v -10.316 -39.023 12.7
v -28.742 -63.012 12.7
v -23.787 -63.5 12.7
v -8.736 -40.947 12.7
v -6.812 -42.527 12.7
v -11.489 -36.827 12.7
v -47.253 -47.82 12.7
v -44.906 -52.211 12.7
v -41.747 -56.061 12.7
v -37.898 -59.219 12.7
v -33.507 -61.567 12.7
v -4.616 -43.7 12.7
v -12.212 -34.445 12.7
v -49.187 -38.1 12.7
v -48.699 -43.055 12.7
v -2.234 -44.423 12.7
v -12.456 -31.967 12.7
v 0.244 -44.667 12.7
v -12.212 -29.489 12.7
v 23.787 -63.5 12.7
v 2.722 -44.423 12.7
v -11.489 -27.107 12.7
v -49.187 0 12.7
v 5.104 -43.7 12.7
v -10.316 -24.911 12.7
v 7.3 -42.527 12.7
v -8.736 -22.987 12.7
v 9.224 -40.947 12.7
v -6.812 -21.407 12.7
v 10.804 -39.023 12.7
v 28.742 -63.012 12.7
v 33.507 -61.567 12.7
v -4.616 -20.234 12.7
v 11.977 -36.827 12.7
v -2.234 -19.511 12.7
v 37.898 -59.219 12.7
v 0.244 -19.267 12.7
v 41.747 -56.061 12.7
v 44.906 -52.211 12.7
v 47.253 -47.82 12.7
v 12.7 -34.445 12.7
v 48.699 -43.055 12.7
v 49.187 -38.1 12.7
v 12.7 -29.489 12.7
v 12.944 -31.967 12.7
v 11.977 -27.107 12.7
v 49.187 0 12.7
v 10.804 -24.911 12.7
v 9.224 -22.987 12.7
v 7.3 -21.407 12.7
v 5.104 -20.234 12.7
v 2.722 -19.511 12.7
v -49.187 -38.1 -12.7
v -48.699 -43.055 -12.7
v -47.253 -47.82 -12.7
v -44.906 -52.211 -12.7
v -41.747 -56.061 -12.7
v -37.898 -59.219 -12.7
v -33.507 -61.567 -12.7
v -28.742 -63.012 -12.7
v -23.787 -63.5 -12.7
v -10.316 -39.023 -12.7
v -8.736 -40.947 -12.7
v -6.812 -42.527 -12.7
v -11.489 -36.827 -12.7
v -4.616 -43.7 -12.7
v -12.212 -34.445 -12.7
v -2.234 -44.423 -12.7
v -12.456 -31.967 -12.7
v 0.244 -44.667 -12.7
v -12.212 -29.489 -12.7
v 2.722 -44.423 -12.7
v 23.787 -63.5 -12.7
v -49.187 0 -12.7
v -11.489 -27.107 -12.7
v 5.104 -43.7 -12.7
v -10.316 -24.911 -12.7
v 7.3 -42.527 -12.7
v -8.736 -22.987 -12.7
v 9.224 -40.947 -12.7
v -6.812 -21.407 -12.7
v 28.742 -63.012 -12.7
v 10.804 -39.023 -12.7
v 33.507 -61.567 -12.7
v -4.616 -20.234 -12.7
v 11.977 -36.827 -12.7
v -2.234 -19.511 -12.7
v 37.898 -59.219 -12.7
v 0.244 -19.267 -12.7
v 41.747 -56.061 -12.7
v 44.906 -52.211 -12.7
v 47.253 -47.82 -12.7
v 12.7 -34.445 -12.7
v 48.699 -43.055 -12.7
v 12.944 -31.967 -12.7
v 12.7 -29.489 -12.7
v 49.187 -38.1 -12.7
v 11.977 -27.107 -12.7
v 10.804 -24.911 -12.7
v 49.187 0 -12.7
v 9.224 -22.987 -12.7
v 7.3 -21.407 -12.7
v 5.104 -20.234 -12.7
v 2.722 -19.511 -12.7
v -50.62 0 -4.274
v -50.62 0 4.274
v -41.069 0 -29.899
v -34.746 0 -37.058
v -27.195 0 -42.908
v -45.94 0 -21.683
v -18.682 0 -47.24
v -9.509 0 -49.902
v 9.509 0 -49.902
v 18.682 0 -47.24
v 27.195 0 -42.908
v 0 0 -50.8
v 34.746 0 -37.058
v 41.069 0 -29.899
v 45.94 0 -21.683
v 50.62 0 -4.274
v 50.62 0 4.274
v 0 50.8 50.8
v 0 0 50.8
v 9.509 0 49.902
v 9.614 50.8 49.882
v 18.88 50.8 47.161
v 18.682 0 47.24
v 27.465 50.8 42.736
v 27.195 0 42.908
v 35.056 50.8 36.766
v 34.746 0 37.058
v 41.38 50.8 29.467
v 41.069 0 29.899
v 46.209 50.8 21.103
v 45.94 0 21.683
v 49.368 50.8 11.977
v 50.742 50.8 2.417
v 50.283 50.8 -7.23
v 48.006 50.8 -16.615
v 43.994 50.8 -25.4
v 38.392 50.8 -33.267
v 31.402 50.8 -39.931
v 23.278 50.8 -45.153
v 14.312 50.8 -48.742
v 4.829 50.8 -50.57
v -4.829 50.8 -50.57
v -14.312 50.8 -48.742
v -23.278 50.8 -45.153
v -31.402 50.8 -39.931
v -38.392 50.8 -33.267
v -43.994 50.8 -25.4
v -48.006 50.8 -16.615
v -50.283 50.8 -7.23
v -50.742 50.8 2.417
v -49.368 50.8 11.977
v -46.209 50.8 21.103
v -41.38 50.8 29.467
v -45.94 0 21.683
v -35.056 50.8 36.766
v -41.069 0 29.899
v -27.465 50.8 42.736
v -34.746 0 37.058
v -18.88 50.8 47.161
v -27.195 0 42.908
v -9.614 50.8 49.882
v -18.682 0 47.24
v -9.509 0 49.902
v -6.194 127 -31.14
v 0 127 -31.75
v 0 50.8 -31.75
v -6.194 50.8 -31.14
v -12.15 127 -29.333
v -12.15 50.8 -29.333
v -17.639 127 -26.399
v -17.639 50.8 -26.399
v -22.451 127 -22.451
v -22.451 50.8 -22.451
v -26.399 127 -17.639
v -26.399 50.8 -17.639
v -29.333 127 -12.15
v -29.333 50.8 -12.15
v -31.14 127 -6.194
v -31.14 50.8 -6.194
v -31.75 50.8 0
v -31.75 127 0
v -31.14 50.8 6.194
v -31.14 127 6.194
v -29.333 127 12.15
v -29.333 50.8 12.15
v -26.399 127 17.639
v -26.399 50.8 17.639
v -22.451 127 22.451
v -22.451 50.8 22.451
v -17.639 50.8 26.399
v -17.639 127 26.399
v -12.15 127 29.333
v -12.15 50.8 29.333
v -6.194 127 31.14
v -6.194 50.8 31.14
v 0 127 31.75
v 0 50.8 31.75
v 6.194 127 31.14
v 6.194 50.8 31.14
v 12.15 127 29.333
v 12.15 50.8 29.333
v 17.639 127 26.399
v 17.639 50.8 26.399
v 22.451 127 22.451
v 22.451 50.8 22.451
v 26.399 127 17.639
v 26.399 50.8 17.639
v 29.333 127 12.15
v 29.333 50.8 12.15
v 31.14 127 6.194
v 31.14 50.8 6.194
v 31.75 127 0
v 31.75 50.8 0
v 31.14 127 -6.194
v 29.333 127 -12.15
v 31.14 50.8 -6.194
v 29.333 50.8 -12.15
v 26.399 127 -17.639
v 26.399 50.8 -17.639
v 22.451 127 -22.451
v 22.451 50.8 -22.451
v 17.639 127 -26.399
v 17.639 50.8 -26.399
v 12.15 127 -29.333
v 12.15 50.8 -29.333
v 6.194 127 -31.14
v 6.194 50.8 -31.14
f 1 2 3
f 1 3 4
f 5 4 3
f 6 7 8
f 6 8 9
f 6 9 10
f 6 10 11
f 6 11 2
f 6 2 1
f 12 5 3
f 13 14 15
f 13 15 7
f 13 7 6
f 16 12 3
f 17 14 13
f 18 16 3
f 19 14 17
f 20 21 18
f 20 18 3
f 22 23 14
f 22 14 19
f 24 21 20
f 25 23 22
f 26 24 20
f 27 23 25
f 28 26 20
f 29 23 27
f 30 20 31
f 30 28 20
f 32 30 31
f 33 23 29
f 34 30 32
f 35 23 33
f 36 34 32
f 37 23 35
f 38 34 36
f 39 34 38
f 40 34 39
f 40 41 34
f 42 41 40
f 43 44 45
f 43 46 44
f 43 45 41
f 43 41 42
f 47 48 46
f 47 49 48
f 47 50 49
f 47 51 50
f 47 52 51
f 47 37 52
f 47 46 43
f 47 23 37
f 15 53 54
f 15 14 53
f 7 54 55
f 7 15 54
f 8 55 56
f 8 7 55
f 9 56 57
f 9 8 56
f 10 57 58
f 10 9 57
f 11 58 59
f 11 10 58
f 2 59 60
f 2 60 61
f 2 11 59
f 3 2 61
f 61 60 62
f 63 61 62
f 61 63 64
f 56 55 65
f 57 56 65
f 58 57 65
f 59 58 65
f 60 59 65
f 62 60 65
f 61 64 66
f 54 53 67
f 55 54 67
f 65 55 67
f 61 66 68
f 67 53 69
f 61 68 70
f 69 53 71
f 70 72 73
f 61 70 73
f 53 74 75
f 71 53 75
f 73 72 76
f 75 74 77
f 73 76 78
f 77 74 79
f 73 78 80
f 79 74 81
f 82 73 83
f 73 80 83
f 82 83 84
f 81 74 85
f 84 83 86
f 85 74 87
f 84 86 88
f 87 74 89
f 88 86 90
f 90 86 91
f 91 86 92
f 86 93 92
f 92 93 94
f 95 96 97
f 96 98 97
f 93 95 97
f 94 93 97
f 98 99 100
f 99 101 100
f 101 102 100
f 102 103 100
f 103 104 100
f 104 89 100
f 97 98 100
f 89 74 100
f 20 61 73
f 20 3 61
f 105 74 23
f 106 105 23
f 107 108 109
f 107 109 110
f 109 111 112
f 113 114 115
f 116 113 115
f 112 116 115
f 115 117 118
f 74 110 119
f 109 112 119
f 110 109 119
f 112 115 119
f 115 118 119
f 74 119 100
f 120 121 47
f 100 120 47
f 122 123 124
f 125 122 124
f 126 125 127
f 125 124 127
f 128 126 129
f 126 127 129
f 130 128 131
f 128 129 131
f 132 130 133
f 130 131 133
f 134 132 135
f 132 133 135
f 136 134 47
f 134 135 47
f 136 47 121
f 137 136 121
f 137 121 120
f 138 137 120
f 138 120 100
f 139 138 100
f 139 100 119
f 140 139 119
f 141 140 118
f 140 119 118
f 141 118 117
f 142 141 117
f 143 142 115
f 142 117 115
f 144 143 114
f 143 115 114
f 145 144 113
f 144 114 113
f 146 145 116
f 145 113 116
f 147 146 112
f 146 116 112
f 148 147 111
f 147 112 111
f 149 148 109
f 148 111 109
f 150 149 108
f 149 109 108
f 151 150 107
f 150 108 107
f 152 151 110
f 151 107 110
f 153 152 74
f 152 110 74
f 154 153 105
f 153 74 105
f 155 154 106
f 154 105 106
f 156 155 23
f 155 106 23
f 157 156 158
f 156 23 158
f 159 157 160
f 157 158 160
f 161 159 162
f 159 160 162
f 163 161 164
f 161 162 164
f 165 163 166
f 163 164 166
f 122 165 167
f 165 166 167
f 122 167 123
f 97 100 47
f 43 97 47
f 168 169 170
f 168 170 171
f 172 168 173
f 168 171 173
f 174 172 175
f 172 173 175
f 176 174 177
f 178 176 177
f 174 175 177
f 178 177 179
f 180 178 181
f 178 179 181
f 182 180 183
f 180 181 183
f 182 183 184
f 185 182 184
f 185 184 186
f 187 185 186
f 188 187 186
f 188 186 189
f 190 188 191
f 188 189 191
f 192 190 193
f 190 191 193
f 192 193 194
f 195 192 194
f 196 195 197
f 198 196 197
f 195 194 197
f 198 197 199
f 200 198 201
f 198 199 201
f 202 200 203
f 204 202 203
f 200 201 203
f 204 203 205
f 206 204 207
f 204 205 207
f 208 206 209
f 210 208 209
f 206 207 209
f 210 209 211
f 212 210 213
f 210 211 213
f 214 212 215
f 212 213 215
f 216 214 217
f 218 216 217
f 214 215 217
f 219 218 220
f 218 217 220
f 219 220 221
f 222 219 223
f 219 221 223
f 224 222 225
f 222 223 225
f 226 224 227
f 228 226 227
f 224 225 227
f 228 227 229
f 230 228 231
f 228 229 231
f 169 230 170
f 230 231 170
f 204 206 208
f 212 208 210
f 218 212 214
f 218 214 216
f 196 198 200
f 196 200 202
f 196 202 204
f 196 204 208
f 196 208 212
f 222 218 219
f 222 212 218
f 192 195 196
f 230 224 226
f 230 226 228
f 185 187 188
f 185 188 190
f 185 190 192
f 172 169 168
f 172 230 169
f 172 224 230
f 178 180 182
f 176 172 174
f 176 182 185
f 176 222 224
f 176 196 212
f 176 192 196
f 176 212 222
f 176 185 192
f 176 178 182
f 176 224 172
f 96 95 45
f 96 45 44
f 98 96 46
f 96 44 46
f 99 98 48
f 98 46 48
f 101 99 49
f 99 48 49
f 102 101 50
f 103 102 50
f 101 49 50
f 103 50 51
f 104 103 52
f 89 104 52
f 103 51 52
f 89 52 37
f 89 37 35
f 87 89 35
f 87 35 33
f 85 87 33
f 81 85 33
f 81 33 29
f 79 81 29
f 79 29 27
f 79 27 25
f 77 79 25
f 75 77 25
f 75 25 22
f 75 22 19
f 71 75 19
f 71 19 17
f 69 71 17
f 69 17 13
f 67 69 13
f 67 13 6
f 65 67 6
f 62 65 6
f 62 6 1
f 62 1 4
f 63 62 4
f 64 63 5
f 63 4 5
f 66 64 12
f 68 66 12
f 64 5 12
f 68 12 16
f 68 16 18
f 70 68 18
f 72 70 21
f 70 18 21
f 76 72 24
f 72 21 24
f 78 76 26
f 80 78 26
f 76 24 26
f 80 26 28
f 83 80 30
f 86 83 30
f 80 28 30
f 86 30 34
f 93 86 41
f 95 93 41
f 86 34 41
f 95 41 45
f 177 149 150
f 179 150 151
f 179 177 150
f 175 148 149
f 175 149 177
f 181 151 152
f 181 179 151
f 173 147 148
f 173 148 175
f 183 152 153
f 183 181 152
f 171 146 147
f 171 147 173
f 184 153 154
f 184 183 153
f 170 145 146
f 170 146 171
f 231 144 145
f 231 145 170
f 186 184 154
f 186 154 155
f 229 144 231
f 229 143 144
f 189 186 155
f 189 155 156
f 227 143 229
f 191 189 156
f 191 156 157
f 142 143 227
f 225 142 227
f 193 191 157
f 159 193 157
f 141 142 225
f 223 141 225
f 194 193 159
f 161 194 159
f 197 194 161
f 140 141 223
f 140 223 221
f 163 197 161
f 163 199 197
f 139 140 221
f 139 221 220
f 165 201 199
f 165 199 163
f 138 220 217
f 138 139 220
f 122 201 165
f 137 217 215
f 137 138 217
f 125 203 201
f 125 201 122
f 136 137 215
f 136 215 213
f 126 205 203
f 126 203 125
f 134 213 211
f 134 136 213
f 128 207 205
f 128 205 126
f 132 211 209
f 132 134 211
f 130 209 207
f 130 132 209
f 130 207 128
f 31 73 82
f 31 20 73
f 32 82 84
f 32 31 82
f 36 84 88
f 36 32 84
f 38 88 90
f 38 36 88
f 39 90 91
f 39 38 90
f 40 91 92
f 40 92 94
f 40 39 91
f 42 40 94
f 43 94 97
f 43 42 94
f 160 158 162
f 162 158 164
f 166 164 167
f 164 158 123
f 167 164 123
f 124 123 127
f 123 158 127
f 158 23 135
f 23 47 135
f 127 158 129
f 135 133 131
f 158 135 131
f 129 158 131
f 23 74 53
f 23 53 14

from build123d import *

# Parameters (mm, degrees)
SKETCH1_R           = 50.8
BOSS_EXTRUDE1_DEPTH = 50.8
SKETCH2_R           = 31.75
BOSS_EXTRUDE2_DEPTH = 76.2
SKETCH3_W           = 98.373776994
SKETCH3_H           = 25.4
BOSS_EXTRUDE3_DEPTH = 63.5
SKETCH4_R           = 12.7
CUT_EXTRUDE1_DEPTH  = 151.804144505
FILLET1_R           = 25.4
FILLET2_R           = 25.4


with BuildPart() as part:
    # Sketch1 → Boss-Extrude1 (new body)
    with BuildSketch(Plane(origin=(0, 0, 0), x_dir=(1, 0, 0), z_dir=(0, 1, 0))):
        with Locations(Location((0, 0, 0), (0, 0, 270))):
            Circle(SKETCH1_R)
    extrude(amount=BOSS_EXTRUDE1_DEPTH)

    # Sketch2 → Boss-Extrude2 (add)
    with BuildSketch(Plane(origin=(0, 50.8, 0), x_dir=(1, 0, 0), z_dir=(0, 1, 0))):
        with Locations(Location((0, 0, 0), (0, 0, 90))):
            Circle(SKETCH2_R)
    extrude(amount=BOSS_EXTRUDE2_DEPTH)

    # Sketch3 → Boss-Extrude3 (add)
    with BuildSketch(Plane.XZ):
        Rectangle(SKETCH3_W, SKETCH3_H)
    extrude(amount=BOSS_EXTRUDE3_DEPTH)

    # Sketch4 → Cut-Extrude1 (cut, through all)
    with BuildSketch(Plane.XY.offset(12.7)):
        with Locations((0.243990196, -31.967064289)):
            Circle(SKETCH4_R)
    extrude(amount=-CUT_EXTRUDE1_DEPTH, mode=Mode.SUBTRACT)

    # Fillet1
    fillet1_edges = [part.edges().sort_by_distance(p)[0] for p in [
        (-49.186888497, -63.5, 0),
    ]]
    fillet(fillet1_edges, radius=FILLET1_R)

    # Fillet2
    fillet2_edges = [part.edges().sort_by_distance(p)[0] for p in [
        (49.186888497, -63.5, 0),
    ]]
    fillet(fillet2_edges, radius=FILLET2_R)


solid = part.part
